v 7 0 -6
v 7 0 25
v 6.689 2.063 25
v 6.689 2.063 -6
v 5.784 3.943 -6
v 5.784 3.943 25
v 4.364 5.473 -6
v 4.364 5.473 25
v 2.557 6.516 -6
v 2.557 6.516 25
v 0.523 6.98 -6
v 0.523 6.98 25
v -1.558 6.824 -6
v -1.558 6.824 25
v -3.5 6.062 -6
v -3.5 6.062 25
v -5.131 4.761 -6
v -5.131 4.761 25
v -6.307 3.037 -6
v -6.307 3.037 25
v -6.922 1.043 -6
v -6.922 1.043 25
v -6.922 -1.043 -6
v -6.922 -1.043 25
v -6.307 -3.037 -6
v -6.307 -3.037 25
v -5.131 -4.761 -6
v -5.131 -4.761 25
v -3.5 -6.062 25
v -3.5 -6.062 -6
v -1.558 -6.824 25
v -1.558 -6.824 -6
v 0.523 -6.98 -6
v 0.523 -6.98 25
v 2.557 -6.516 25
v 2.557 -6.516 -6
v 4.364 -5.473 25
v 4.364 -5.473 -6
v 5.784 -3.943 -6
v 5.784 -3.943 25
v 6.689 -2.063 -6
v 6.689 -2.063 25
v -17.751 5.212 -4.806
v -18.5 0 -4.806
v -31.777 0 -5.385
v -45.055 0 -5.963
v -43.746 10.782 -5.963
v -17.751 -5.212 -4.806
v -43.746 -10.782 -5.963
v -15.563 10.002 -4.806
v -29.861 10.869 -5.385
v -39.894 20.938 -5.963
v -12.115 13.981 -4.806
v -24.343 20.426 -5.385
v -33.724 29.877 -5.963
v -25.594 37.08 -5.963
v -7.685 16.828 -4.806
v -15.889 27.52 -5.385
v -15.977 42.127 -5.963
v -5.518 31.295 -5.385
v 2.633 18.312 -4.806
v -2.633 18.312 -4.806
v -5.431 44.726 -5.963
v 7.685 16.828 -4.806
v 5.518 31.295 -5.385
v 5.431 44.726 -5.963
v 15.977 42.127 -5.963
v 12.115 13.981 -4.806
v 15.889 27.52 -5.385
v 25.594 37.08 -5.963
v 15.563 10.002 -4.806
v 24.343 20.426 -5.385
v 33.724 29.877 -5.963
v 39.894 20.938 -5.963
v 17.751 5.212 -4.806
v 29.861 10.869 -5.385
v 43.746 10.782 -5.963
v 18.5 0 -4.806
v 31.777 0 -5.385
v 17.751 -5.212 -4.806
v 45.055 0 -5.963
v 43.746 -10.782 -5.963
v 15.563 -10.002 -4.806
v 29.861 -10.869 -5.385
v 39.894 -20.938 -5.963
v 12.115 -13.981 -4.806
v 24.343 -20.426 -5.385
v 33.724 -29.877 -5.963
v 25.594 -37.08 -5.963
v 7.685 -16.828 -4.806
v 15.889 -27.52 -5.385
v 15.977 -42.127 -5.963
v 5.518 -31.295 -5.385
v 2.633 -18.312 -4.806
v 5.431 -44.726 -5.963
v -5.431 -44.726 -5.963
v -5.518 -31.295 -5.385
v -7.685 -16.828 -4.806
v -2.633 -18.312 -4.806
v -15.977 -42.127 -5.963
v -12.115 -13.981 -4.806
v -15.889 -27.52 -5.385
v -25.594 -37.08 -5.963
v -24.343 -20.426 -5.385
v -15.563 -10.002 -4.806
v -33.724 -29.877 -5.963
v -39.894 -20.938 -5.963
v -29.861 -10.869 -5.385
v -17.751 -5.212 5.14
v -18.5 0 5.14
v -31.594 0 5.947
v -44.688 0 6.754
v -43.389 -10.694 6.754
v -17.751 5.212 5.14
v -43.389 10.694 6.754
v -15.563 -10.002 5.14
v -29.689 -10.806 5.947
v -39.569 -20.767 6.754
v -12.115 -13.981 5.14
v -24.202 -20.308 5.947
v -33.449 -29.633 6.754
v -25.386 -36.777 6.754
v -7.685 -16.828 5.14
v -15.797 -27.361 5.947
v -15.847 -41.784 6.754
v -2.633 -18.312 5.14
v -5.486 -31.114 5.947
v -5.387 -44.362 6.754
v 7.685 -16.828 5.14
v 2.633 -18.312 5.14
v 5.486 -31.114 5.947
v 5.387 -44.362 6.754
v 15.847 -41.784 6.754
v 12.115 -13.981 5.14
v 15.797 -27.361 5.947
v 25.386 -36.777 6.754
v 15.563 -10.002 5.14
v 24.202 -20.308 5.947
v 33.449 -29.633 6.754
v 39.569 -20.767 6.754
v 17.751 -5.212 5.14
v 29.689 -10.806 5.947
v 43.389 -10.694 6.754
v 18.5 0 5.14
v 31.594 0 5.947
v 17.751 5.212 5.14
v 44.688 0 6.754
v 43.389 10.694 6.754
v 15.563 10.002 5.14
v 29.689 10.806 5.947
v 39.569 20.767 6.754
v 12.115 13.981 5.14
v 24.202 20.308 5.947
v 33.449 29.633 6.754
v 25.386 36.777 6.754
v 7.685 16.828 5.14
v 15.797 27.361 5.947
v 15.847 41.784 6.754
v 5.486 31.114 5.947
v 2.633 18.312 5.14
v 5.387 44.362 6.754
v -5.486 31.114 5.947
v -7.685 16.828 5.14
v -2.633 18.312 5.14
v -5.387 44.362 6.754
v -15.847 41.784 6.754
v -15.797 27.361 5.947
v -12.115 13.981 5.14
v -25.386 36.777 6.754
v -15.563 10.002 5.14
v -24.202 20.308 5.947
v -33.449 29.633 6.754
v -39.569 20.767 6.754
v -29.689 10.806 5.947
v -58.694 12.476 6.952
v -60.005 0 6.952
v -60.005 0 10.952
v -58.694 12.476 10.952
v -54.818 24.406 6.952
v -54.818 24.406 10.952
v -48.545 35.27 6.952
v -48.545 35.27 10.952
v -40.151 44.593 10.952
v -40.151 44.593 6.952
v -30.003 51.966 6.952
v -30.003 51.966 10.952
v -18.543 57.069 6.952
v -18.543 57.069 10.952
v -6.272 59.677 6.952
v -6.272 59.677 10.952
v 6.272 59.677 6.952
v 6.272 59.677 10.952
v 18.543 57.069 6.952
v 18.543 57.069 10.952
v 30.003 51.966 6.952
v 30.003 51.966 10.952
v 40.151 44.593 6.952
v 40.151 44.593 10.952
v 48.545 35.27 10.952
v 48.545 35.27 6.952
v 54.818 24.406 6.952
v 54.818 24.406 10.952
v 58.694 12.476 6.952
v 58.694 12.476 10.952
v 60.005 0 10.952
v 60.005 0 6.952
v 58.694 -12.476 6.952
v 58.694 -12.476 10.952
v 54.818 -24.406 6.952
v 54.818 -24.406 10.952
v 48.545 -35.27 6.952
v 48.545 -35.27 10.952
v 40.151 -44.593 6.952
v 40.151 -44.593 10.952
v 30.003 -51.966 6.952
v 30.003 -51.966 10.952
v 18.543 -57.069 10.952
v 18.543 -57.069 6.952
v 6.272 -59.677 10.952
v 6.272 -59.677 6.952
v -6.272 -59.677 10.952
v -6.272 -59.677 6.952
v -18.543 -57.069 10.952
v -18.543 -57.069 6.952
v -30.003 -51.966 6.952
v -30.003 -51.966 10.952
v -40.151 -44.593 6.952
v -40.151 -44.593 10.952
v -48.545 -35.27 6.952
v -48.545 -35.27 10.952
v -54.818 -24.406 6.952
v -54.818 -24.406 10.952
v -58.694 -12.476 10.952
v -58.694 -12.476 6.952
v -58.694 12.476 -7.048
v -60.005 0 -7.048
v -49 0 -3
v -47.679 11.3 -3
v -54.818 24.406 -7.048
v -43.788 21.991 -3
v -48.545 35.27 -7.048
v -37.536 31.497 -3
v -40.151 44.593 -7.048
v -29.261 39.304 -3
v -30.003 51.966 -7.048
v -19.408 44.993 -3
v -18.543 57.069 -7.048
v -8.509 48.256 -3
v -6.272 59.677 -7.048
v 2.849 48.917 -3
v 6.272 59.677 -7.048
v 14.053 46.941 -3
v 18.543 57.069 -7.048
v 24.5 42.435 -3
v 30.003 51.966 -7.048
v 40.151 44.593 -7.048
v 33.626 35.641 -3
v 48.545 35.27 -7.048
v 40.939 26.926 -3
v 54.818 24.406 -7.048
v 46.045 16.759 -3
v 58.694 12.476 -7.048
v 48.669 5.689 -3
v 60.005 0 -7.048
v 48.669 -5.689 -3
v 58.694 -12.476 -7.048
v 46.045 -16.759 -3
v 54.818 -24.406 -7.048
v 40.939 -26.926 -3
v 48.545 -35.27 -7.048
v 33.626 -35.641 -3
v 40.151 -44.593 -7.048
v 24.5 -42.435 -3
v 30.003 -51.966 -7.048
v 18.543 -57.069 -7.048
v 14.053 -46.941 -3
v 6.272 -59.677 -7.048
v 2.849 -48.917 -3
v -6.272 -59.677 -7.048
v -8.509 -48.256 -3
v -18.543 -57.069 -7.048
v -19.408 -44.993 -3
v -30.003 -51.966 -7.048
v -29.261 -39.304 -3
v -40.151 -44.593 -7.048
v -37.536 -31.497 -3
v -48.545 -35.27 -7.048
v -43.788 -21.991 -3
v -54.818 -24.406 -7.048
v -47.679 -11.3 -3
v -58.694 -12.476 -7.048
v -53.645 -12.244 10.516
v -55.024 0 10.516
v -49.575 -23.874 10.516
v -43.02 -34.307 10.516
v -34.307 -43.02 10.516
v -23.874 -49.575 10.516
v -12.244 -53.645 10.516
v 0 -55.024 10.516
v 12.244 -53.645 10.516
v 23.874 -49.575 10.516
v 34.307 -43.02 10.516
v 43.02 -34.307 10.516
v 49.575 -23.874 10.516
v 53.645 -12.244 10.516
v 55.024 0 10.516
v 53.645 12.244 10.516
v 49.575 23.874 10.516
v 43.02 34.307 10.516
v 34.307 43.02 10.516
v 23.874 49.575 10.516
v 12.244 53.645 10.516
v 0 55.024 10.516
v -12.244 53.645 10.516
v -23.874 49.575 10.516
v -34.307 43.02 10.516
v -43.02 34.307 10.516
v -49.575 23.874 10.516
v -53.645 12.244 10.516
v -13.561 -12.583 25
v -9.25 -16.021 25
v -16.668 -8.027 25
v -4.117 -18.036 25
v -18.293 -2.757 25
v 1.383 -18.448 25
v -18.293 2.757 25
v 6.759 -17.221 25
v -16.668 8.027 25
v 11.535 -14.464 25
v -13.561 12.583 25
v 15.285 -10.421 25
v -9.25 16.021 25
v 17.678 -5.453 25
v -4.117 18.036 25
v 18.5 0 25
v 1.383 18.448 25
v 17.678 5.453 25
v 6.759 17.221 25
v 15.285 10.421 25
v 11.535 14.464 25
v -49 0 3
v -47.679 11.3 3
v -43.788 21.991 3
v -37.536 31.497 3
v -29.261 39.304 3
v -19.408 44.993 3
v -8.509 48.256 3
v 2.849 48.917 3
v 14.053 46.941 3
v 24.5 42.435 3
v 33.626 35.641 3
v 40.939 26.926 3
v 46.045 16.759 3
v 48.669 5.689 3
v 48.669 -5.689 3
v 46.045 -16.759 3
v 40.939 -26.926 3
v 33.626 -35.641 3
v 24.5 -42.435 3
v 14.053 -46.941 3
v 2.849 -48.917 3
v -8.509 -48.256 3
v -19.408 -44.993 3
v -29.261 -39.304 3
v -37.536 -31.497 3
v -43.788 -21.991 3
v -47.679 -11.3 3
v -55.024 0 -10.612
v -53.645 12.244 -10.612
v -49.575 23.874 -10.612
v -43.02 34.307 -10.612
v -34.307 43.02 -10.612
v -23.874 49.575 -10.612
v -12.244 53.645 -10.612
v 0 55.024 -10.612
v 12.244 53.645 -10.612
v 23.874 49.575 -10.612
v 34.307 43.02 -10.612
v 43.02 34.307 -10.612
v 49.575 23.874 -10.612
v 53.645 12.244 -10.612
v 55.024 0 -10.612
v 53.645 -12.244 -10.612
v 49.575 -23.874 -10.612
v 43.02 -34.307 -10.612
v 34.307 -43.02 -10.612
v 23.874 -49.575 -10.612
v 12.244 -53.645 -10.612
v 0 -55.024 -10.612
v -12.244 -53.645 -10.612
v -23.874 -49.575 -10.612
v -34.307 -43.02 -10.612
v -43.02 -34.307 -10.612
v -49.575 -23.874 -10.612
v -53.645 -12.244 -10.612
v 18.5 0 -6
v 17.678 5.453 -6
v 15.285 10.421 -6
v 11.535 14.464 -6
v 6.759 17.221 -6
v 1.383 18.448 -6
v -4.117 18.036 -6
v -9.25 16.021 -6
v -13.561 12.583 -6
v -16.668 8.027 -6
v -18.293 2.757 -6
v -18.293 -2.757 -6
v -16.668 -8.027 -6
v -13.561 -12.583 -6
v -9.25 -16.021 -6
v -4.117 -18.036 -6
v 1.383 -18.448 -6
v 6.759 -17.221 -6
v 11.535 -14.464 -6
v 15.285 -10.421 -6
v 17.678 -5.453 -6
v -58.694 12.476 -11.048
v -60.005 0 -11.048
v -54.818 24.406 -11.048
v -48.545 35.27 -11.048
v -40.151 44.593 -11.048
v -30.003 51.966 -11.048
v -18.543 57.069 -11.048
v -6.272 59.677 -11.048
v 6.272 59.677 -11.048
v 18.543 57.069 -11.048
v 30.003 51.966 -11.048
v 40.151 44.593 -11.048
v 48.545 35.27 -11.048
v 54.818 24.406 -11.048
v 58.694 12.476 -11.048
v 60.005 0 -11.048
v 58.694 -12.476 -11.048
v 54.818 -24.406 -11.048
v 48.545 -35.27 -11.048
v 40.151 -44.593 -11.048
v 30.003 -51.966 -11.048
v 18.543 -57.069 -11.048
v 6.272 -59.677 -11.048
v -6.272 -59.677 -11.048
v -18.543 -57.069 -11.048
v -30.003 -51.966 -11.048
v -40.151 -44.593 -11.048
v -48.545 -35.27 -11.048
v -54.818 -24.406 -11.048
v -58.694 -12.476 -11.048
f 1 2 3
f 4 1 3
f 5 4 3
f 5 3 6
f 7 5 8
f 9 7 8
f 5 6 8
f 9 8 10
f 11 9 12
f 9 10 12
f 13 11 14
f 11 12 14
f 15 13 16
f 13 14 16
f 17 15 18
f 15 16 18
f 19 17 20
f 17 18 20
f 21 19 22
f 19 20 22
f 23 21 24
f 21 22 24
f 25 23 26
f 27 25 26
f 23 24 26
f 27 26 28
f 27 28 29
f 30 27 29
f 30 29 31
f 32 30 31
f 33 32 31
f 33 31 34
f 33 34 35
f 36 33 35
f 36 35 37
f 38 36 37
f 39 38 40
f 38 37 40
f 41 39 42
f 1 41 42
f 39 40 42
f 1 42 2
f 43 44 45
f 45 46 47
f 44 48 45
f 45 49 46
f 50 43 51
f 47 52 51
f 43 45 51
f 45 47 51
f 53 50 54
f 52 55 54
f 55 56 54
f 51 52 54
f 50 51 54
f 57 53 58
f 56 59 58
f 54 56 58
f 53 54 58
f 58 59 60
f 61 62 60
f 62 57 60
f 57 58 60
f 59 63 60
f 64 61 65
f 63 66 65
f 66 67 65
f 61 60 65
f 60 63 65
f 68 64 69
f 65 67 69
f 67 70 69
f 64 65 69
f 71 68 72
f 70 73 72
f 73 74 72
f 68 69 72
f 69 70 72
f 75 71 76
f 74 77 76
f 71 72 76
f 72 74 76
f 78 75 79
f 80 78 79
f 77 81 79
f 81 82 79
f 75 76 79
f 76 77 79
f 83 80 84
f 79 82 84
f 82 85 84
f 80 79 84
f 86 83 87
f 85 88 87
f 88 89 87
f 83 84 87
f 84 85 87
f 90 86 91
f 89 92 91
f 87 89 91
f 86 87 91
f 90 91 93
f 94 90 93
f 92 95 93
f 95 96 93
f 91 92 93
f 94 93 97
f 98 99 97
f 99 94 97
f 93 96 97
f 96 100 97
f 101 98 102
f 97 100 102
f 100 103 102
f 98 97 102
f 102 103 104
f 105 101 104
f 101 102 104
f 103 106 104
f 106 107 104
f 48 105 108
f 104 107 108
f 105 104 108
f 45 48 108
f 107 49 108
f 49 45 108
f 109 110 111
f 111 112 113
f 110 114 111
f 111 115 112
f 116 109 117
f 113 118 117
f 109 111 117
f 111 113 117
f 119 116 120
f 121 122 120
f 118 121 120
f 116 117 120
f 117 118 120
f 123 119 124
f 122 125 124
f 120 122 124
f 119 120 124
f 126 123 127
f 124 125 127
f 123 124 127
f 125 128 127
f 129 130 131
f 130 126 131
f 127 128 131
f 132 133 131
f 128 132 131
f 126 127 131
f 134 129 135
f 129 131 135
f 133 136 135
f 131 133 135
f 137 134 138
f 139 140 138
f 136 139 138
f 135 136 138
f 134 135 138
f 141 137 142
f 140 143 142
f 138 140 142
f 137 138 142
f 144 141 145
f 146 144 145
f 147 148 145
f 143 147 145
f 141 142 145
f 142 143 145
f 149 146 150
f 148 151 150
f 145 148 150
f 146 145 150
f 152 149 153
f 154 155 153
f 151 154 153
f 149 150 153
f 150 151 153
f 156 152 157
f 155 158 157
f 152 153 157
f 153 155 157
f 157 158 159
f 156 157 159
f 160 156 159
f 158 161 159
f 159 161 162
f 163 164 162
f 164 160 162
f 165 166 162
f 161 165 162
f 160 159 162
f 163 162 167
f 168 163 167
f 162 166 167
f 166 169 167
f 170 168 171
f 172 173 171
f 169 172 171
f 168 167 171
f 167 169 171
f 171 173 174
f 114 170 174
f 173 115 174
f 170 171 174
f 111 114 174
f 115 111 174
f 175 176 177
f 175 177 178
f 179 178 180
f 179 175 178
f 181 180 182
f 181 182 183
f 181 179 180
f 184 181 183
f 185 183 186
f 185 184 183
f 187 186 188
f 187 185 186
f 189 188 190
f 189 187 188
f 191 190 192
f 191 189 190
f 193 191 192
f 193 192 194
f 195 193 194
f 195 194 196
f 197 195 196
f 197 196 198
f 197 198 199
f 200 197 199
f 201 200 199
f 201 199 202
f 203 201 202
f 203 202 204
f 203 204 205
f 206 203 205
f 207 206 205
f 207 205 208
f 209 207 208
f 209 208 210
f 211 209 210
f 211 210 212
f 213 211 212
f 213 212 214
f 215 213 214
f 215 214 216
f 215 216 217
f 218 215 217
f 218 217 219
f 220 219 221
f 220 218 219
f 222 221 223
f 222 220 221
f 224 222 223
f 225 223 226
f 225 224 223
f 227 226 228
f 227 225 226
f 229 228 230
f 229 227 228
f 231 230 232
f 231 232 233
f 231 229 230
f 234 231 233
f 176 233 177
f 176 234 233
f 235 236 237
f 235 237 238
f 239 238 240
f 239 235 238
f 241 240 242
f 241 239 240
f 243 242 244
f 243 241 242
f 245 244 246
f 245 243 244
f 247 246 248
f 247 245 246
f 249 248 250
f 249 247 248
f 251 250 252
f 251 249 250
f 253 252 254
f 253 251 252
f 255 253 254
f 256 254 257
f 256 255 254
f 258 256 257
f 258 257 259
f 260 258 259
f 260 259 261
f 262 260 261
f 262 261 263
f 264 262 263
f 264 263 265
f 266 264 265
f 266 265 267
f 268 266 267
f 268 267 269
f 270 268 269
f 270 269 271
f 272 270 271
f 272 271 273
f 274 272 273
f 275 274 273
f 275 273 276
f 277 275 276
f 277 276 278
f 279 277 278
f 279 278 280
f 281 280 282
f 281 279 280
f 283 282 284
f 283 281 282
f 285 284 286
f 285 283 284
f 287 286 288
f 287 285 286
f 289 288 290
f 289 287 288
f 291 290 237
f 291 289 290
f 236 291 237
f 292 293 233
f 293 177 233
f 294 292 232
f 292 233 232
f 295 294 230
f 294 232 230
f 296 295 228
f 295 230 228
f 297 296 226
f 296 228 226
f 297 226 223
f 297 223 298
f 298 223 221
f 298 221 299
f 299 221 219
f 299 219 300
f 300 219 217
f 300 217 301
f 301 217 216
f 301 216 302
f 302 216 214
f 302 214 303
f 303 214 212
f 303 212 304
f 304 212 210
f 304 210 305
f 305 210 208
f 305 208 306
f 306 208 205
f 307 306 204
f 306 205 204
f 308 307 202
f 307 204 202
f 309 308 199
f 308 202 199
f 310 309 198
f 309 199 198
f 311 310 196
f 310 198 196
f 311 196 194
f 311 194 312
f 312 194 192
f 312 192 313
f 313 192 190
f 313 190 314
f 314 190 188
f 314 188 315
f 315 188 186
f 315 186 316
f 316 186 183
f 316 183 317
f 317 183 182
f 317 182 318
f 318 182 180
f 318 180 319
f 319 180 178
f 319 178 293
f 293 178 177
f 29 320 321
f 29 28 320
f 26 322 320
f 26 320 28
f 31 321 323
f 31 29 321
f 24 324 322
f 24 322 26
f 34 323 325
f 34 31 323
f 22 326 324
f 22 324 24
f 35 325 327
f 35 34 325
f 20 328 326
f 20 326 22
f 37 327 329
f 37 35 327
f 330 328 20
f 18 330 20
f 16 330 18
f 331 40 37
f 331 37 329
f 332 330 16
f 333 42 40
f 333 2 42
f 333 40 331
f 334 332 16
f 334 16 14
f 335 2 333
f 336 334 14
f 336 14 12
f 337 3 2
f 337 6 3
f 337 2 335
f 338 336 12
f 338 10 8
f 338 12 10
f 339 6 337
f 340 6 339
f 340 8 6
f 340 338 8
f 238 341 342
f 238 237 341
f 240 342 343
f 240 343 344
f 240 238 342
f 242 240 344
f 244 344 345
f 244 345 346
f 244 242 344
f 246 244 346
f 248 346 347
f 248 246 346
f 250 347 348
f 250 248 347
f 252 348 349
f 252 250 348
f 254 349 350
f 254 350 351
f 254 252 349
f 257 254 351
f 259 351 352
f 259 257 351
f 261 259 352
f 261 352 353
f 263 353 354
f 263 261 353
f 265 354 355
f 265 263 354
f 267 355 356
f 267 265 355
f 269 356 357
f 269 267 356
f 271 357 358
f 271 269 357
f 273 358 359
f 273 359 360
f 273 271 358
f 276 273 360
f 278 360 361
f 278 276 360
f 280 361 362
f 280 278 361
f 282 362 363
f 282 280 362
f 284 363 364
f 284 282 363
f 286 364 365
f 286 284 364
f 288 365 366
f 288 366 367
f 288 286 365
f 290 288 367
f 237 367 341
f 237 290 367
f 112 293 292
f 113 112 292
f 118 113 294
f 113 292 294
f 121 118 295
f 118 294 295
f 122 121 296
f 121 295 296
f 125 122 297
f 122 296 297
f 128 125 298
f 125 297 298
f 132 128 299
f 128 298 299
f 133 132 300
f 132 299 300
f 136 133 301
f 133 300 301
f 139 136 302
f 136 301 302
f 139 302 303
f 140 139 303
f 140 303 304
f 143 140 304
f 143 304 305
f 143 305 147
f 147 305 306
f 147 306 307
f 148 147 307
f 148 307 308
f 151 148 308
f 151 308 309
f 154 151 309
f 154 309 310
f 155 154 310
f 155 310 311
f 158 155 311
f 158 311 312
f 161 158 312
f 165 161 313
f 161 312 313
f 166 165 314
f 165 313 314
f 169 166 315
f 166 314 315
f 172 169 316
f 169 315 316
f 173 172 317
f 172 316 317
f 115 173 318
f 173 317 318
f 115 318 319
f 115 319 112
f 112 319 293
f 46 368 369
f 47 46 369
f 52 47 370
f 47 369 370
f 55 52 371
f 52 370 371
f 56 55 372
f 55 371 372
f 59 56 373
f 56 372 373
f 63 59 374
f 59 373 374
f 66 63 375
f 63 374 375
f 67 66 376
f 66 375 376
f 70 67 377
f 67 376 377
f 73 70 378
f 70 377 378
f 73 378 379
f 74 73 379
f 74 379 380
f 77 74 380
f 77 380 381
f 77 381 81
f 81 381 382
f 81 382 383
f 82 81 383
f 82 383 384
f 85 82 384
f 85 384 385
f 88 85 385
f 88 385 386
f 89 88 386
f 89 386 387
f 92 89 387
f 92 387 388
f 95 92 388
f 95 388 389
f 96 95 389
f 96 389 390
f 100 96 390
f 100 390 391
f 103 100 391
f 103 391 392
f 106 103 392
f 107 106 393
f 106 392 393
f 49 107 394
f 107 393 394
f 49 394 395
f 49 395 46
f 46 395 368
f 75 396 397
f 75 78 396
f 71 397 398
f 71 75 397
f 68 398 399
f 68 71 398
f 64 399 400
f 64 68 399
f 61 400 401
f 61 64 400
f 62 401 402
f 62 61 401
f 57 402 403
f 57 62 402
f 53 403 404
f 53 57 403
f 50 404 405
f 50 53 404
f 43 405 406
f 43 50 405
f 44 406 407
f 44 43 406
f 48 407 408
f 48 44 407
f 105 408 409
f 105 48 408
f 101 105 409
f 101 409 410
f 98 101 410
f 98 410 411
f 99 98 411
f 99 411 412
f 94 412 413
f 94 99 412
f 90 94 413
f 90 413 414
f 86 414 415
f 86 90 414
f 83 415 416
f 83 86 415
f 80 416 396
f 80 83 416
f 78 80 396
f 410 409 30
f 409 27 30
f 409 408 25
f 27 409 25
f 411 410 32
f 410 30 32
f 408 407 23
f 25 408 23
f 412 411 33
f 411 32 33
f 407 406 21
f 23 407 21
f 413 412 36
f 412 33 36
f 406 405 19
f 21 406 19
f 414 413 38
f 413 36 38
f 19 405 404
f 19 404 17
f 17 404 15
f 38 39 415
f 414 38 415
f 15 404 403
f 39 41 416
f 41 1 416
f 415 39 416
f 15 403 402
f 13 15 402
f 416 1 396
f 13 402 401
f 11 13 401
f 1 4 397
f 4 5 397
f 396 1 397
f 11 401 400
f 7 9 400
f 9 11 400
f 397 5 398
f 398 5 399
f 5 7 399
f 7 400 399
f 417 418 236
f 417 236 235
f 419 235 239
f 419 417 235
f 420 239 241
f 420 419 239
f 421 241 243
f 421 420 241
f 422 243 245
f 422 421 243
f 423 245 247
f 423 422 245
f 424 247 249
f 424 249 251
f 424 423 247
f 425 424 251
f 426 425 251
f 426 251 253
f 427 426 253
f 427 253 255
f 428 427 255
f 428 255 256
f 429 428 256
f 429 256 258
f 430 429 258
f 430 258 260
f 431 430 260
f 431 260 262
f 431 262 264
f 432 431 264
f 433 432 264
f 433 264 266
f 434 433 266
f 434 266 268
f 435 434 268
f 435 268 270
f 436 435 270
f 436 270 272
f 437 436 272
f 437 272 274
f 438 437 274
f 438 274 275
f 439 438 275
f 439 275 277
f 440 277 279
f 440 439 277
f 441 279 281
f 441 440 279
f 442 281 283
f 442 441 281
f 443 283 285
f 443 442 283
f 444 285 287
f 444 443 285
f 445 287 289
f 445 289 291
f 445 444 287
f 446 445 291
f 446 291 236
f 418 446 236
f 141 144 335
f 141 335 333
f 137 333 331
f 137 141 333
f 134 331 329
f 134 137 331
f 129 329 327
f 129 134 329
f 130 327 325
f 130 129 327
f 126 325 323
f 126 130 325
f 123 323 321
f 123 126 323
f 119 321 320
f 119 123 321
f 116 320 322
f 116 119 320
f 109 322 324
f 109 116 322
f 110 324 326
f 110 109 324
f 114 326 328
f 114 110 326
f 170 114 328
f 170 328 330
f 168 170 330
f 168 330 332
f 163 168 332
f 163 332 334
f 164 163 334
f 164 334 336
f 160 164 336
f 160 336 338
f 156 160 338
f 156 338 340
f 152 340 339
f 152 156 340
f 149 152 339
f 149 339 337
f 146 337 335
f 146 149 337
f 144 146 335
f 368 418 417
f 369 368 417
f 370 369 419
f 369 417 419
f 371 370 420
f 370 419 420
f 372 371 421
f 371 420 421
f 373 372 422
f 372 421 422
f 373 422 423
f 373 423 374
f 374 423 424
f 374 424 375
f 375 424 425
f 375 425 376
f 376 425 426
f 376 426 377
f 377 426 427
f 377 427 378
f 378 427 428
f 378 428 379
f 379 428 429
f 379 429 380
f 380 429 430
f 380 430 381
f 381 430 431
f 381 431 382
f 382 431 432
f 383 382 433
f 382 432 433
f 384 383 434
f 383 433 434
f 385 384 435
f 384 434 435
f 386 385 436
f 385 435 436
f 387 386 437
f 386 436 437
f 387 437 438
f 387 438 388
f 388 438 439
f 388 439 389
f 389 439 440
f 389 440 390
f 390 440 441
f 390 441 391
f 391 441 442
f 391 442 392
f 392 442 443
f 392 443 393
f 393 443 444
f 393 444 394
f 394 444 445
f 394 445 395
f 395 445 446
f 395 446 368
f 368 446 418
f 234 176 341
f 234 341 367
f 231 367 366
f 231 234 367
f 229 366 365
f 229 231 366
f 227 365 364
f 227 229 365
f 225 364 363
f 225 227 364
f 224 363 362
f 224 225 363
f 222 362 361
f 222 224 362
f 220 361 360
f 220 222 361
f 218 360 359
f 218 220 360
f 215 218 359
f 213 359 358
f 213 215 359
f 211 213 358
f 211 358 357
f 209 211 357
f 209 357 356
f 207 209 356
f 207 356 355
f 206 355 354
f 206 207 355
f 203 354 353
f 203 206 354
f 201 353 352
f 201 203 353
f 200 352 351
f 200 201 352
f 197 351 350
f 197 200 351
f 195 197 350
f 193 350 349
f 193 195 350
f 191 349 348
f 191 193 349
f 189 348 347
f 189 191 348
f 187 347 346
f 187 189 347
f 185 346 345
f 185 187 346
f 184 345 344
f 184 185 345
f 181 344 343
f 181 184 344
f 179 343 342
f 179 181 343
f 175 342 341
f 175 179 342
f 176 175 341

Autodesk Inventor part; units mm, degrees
ref_plane "YZ Plane" through (0, 0, 0) normal (1, 0, 0) x (0, 1, 0)
ref_plane "XZ Plane" through (0, 0, 0) normal (0, 1, 0) x (-1, 0, 0)
ref_plane "XY Plane" through (0, 0, 0) normal (0, 0, 1) x (1, 0, 0)
sketch "Sketch1" plane through (0, 0, 0) normal (0, 1, 0) x (-1, 0, 0)
  line L0 (0.0054, 10.9523) -> (60.0054, 10.9523)
  line L1 (60.0054, 10.9523) -> (60.0054, -11.0477)
  line L2 (60.0054, -11.0477) -> (0.0054, -11.0477)
  line L3 (0.0054, -11.0477) -> (0.0054, 10.9523)
  line L4 (60.0054, 10.9523) -> (60.0054, 6.9523)
  line L5 (60.0054, -11.0477) -> (60.0054, -7.0477)
  line L6 (60.0054, -0.0477) -> (49.0054, -0.0477)
  line L7 (49, 3) -> (49, -3)
  line L8 (49, 3) -> (55, 3) construction
  line L9 (49, -3) -> (60.0054, -7.0477)
  line L10 (49, 3) -> (60.0054, 6.9523)
  line L11 (60.0054, 10.9523) -> (45.0054, 10.9523)
  line L12 (60.0054, 10.9523) -> (55.0244, 10.5165)
  line L13 (60.0054, 10.9523) -> (65.0054, 10.9523) construction
  line L14 (55.0244, 10.5165) -> (44.6878, 6.7543)
  line L15 (55.0244, 10.5165) -> (66.0244, 10.5165) construction
  line L16 (60.0054, -11.0477) -> (55.0244, -10.612)
  line L17 (60.0054, -11.0477) -> (65.0054, -11.0477) construction
  line L18 (55.0244, -10.612) -> (45.055, -5.9631)
  line L19 (0, 4) -> (0, -4)
  line L20 (0, 4) -> (8, 4) construction
  line L21 (0, -4) -> (45.055, -5.9631)
  line L22 (44.6878, 6.7543) -> (0, 4)
  dimension "d1" = 60
  dimension "d2" = 22
  dimension "d3" = 4
  dimension "d4" = 4
  dimension "d5" = 11
  dimension "d6" = 6
  dimension "d7" = 90
  dimension "d8" = 15
  dimension "d9" = 5
  dimension "d10" = 175
  dimension "d11" = 11
  dimension "d12" = 160
  dimension "d13" = 5
  dimension "d14" = 175
  dimension "d15" = 11
  dimension "d16" = 160
  dimension "d17" = 8
  dimension "d18" = 90
revolve "Revolution1" add sketch "Sketch1" angle 360 about axis through (0, 0, 4) along (0, 0, -1) contours L22 L14 L12 L1 L10 L7 L9 L16 L18 L21 L3 | L3 L21 L19 L22
sketch "Sketch2" plane through (0, 0, 0) normal (0, 0, 1) x (1, 0, 0)
  circle A0 centre (0, 0) radius 18.5
  dimension "d20" = 37
extrude "Extrusion1" add sketch "Sketch2" along normal blind 25 and the other way blind 6
sketch "Sketch4" plane through (0, 0, 25) normal (0, 0, 1) x (1, 0, 0)
  circle A0 centre (0, 0) radius 7
  dimension "d25" = 14
extrude "Extrusion2" cut sketch "Sketch4" against normal blind 36
properties part number "bánh đà"
